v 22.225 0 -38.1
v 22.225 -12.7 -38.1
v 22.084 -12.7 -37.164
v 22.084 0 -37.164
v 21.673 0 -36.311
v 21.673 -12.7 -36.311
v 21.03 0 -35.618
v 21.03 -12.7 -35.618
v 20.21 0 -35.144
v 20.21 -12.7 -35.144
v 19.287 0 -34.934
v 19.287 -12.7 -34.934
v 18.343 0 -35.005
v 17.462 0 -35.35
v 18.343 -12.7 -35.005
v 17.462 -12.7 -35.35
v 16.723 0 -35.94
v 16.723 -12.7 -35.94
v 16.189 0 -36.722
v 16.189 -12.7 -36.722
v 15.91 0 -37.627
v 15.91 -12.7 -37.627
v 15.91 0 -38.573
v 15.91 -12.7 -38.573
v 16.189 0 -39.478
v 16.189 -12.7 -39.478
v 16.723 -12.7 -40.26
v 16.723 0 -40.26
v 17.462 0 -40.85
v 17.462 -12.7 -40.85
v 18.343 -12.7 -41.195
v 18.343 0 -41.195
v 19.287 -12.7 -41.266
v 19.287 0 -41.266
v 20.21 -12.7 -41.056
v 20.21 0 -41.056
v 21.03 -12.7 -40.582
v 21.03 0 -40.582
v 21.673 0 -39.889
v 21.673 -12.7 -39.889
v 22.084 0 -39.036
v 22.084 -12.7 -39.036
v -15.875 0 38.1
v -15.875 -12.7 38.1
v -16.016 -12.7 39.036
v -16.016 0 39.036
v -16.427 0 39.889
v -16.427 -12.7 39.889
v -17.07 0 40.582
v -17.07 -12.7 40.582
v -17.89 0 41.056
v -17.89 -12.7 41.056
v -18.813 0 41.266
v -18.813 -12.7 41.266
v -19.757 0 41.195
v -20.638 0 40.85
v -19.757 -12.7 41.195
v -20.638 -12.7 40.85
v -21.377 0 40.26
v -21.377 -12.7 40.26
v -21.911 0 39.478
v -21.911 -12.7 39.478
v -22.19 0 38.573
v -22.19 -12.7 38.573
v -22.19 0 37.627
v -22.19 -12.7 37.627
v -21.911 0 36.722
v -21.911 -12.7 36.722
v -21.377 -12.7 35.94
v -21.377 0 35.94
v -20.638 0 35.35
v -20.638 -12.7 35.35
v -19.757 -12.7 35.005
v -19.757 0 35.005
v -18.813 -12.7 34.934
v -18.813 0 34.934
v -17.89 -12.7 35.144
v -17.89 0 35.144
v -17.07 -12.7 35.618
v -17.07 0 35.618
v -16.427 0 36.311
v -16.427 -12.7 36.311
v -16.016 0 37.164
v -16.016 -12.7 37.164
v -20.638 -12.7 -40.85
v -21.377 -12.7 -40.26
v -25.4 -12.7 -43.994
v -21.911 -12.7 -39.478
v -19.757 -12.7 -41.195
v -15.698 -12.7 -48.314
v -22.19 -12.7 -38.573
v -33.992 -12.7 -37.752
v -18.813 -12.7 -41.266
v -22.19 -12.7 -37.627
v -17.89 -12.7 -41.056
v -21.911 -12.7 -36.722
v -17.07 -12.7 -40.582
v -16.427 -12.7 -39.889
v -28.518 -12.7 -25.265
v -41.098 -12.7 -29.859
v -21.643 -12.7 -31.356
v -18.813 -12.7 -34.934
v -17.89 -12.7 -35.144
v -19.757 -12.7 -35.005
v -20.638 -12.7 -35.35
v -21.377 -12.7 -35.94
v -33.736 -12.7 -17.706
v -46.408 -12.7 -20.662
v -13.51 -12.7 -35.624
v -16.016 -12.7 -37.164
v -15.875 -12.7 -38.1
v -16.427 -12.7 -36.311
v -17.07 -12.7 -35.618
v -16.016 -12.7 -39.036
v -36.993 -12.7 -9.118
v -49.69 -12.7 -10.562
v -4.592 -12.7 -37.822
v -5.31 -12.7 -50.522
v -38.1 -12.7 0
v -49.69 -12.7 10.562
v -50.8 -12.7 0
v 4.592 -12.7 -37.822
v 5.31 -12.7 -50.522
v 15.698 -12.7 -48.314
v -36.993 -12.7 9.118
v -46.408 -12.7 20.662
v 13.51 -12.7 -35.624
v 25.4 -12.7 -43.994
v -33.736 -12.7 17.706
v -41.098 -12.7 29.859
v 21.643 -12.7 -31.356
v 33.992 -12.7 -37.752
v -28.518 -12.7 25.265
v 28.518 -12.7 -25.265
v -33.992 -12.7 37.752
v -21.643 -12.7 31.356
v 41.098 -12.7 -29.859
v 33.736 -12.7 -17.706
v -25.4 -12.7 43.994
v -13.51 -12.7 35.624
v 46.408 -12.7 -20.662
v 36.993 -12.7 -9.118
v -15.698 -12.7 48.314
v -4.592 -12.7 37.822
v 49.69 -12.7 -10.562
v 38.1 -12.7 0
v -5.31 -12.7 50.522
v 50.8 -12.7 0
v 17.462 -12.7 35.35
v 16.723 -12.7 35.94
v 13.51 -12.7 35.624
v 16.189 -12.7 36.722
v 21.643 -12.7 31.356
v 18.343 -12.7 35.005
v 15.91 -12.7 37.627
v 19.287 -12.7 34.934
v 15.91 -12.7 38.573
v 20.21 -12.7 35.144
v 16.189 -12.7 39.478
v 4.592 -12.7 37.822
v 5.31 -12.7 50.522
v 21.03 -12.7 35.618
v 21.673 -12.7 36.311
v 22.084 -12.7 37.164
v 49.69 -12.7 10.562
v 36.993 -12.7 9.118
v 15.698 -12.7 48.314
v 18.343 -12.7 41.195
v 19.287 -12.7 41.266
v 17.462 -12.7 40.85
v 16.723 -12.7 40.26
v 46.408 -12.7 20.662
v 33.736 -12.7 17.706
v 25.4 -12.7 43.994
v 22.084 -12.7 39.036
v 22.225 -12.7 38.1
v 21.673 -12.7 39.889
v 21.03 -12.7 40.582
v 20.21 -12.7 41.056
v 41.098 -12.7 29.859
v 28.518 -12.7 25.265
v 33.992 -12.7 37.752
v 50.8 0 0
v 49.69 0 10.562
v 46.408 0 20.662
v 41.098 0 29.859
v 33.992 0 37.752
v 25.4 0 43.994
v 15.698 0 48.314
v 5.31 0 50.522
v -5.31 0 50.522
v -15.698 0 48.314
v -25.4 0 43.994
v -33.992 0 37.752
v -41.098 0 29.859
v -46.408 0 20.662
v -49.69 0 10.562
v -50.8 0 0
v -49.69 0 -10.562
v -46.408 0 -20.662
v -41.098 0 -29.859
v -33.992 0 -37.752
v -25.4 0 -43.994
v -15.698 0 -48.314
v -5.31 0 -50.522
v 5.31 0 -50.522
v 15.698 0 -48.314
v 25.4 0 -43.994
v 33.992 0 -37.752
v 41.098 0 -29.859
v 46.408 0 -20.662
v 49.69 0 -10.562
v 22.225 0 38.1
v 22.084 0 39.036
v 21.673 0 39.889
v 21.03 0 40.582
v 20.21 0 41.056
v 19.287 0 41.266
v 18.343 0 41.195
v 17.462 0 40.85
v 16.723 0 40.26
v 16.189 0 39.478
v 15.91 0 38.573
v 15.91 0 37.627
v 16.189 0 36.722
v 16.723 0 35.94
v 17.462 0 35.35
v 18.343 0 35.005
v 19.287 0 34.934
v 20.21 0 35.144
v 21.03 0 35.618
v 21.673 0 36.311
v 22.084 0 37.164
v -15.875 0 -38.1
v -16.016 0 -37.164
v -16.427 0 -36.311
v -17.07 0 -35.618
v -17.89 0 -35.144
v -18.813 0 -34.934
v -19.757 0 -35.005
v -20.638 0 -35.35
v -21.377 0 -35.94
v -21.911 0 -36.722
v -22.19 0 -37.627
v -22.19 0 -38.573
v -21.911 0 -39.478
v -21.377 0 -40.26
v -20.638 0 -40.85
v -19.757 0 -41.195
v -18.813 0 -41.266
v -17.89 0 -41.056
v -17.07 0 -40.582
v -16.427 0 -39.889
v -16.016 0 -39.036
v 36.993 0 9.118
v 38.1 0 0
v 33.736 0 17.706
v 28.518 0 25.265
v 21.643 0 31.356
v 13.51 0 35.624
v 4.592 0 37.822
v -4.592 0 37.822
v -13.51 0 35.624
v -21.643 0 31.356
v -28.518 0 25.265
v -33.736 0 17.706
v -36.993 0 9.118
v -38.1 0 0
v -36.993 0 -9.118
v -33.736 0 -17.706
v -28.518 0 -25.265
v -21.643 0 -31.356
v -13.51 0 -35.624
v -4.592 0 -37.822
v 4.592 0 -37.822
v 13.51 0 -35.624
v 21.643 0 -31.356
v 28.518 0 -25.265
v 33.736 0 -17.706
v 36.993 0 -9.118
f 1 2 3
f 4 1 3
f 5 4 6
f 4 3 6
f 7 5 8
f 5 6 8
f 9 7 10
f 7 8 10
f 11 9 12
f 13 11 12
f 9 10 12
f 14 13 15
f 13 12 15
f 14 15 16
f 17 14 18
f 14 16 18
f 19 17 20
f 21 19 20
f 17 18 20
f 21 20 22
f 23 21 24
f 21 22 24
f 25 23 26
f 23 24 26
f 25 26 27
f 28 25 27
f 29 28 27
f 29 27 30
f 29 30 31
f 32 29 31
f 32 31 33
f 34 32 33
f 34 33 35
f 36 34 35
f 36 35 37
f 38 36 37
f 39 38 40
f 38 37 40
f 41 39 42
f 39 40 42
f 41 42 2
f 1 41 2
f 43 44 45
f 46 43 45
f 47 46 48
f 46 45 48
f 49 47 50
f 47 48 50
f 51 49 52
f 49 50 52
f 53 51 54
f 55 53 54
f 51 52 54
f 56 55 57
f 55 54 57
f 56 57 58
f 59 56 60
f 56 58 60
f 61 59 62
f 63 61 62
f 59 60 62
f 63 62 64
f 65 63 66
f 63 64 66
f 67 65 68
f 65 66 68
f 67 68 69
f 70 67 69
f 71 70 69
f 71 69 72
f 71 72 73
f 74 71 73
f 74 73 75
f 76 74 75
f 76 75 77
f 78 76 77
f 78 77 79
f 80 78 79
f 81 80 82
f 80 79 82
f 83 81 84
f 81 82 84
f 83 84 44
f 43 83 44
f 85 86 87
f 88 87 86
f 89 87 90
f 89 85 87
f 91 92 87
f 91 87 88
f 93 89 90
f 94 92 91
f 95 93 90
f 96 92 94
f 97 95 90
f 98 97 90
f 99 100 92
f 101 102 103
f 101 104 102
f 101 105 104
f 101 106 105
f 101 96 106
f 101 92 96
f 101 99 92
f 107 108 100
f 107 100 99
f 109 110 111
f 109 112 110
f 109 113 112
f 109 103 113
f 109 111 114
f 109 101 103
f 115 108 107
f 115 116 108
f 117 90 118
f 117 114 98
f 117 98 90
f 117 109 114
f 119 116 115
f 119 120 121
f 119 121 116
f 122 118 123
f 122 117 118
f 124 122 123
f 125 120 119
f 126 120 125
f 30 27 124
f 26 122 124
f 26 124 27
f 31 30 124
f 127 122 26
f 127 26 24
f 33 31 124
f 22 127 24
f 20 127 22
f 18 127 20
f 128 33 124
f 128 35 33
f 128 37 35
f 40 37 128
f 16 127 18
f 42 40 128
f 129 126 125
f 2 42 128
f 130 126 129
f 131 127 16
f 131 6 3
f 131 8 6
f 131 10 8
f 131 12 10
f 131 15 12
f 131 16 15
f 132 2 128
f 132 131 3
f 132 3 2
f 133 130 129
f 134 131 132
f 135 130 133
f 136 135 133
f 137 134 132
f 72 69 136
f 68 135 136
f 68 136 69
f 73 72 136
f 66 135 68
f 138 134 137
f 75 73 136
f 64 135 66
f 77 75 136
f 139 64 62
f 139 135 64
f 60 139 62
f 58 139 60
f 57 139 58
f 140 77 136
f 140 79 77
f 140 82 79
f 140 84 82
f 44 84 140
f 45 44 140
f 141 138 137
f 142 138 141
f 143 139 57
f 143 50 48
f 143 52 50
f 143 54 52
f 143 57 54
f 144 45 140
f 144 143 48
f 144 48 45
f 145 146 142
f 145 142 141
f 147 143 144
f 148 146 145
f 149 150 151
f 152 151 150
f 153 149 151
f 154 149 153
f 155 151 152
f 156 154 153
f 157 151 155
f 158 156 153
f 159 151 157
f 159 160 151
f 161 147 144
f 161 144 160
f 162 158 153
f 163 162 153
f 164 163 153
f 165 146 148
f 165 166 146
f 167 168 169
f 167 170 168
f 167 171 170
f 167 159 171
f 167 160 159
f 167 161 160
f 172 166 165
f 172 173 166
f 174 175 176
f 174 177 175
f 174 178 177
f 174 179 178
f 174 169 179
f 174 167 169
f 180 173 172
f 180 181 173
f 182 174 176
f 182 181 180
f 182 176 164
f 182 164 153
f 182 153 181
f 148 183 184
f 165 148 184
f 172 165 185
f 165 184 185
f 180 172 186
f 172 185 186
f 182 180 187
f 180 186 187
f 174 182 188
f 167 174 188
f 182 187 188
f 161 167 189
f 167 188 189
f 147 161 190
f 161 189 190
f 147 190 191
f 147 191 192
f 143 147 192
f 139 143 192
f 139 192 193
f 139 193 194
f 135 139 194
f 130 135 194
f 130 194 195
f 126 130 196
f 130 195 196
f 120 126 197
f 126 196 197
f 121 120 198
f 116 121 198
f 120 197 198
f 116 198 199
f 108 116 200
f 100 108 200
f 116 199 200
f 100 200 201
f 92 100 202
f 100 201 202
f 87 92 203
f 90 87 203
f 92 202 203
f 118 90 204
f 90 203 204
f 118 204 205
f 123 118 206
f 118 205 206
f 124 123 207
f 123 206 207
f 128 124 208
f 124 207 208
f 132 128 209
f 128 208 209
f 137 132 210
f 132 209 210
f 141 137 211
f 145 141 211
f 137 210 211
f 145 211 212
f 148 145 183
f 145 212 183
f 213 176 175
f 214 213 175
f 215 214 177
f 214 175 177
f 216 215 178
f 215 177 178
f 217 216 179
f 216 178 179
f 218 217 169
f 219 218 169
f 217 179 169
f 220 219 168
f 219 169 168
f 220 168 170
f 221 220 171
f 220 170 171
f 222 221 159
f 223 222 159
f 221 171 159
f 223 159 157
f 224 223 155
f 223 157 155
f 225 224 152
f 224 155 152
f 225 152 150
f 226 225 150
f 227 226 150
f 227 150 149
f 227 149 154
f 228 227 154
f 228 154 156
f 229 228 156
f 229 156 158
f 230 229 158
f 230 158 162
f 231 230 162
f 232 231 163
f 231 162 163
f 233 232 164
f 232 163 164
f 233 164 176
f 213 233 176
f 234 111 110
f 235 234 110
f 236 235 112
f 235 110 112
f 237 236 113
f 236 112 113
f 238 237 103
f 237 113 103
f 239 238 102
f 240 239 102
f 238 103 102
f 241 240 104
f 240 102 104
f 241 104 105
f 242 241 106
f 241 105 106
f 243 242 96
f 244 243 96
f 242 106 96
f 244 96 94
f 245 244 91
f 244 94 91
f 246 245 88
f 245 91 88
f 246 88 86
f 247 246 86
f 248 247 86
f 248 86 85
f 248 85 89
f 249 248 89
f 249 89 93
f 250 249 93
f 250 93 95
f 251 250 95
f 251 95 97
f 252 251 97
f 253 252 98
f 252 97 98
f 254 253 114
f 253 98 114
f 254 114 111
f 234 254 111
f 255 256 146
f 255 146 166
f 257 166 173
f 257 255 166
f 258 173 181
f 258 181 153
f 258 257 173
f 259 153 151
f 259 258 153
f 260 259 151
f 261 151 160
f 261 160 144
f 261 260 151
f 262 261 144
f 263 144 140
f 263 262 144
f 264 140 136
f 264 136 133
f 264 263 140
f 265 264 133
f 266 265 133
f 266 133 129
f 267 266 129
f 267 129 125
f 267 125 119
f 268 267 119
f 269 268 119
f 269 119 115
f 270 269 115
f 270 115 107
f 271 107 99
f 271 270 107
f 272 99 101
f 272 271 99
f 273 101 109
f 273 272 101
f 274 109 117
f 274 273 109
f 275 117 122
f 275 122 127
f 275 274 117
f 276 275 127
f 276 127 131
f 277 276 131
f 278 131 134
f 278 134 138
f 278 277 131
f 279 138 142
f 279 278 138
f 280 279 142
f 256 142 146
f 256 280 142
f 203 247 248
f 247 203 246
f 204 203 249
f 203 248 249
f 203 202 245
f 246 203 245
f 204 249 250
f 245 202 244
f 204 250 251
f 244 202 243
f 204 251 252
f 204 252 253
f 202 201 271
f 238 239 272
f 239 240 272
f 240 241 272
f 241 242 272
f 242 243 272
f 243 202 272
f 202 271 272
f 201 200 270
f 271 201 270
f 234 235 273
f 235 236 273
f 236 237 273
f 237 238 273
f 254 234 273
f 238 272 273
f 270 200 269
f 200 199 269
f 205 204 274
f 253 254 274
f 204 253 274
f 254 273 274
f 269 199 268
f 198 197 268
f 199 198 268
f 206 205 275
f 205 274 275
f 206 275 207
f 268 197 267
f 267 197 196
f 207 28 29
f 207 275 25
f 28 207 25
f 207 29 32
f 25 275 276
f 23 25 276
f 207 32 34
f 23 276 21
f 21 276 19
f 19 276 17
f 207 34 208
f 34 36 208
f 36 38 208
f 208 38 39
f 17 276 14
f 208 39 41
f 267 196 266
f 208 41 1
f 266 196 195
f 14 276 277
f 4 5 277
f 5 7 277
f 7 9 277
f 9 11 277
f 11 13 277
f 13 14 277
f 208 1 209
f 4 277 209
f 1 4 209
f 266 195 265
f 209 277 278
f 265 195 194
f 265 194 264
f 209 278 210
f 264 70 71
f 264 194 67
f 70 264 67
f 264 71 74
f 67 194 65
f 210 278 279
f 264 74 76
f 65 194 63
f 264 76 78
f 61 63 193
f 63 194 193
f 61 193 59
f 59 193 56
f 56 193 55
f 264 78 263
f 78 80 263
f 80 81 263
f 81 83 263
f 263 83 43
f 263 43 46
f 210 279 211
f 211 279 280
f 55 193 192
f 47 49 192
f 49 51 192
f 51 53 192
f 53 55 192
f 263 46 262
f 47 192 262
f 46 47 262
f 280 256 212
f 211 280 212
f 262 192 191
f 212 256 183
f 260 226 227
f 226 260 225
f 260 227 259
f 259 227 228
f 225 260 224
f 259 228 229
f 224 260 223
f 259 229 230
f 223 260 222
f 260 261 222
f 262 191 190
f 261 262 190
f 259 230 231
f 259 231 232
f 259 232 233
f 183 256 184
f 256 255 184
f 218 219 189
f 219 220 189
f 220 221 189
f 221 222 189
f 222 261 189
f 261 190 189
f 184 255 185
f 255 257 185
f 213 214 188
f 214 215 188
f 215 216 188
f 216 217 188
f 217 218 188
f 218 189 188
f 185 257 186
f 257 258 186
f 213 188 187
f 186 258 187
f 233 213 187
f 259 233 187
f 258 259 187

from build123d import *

# Parameters (mm, degrees)
F0_R     = 50.8
F0_R_2   = 38.1
F1_DEPTH = 12.7
F2_R     = 3.175
F3_DEPTH = 12.7


with BuildPart() as f1:
    # F0 (on Front) → F1 (new body)
    with BuildSketch(Plane.XZ):
        Circle(F0_R)
        Circle(F0_R_2, mode=Mode.SUBTRACT)
    extrude(amount=F1_DEPTH)

    # F2 (on face) → F3 (cut)
    with BuildSketch(Plane.XZ.offset(12.7)):
        with Locations((-19.05, 38.1)):
            Circle(F2_R)
        with Locations((19.05, 38.1)):
            Circle(F2_R)
        with Locations((19.05, -38.1)):
            Circle(F2_R)
        with Locations((-19.05, -38.1)):
            Circle(F2_R)
    extrude(amount=-F3_DEPTH, mode=Mode.SUBTRACT)


solid = f1.part
